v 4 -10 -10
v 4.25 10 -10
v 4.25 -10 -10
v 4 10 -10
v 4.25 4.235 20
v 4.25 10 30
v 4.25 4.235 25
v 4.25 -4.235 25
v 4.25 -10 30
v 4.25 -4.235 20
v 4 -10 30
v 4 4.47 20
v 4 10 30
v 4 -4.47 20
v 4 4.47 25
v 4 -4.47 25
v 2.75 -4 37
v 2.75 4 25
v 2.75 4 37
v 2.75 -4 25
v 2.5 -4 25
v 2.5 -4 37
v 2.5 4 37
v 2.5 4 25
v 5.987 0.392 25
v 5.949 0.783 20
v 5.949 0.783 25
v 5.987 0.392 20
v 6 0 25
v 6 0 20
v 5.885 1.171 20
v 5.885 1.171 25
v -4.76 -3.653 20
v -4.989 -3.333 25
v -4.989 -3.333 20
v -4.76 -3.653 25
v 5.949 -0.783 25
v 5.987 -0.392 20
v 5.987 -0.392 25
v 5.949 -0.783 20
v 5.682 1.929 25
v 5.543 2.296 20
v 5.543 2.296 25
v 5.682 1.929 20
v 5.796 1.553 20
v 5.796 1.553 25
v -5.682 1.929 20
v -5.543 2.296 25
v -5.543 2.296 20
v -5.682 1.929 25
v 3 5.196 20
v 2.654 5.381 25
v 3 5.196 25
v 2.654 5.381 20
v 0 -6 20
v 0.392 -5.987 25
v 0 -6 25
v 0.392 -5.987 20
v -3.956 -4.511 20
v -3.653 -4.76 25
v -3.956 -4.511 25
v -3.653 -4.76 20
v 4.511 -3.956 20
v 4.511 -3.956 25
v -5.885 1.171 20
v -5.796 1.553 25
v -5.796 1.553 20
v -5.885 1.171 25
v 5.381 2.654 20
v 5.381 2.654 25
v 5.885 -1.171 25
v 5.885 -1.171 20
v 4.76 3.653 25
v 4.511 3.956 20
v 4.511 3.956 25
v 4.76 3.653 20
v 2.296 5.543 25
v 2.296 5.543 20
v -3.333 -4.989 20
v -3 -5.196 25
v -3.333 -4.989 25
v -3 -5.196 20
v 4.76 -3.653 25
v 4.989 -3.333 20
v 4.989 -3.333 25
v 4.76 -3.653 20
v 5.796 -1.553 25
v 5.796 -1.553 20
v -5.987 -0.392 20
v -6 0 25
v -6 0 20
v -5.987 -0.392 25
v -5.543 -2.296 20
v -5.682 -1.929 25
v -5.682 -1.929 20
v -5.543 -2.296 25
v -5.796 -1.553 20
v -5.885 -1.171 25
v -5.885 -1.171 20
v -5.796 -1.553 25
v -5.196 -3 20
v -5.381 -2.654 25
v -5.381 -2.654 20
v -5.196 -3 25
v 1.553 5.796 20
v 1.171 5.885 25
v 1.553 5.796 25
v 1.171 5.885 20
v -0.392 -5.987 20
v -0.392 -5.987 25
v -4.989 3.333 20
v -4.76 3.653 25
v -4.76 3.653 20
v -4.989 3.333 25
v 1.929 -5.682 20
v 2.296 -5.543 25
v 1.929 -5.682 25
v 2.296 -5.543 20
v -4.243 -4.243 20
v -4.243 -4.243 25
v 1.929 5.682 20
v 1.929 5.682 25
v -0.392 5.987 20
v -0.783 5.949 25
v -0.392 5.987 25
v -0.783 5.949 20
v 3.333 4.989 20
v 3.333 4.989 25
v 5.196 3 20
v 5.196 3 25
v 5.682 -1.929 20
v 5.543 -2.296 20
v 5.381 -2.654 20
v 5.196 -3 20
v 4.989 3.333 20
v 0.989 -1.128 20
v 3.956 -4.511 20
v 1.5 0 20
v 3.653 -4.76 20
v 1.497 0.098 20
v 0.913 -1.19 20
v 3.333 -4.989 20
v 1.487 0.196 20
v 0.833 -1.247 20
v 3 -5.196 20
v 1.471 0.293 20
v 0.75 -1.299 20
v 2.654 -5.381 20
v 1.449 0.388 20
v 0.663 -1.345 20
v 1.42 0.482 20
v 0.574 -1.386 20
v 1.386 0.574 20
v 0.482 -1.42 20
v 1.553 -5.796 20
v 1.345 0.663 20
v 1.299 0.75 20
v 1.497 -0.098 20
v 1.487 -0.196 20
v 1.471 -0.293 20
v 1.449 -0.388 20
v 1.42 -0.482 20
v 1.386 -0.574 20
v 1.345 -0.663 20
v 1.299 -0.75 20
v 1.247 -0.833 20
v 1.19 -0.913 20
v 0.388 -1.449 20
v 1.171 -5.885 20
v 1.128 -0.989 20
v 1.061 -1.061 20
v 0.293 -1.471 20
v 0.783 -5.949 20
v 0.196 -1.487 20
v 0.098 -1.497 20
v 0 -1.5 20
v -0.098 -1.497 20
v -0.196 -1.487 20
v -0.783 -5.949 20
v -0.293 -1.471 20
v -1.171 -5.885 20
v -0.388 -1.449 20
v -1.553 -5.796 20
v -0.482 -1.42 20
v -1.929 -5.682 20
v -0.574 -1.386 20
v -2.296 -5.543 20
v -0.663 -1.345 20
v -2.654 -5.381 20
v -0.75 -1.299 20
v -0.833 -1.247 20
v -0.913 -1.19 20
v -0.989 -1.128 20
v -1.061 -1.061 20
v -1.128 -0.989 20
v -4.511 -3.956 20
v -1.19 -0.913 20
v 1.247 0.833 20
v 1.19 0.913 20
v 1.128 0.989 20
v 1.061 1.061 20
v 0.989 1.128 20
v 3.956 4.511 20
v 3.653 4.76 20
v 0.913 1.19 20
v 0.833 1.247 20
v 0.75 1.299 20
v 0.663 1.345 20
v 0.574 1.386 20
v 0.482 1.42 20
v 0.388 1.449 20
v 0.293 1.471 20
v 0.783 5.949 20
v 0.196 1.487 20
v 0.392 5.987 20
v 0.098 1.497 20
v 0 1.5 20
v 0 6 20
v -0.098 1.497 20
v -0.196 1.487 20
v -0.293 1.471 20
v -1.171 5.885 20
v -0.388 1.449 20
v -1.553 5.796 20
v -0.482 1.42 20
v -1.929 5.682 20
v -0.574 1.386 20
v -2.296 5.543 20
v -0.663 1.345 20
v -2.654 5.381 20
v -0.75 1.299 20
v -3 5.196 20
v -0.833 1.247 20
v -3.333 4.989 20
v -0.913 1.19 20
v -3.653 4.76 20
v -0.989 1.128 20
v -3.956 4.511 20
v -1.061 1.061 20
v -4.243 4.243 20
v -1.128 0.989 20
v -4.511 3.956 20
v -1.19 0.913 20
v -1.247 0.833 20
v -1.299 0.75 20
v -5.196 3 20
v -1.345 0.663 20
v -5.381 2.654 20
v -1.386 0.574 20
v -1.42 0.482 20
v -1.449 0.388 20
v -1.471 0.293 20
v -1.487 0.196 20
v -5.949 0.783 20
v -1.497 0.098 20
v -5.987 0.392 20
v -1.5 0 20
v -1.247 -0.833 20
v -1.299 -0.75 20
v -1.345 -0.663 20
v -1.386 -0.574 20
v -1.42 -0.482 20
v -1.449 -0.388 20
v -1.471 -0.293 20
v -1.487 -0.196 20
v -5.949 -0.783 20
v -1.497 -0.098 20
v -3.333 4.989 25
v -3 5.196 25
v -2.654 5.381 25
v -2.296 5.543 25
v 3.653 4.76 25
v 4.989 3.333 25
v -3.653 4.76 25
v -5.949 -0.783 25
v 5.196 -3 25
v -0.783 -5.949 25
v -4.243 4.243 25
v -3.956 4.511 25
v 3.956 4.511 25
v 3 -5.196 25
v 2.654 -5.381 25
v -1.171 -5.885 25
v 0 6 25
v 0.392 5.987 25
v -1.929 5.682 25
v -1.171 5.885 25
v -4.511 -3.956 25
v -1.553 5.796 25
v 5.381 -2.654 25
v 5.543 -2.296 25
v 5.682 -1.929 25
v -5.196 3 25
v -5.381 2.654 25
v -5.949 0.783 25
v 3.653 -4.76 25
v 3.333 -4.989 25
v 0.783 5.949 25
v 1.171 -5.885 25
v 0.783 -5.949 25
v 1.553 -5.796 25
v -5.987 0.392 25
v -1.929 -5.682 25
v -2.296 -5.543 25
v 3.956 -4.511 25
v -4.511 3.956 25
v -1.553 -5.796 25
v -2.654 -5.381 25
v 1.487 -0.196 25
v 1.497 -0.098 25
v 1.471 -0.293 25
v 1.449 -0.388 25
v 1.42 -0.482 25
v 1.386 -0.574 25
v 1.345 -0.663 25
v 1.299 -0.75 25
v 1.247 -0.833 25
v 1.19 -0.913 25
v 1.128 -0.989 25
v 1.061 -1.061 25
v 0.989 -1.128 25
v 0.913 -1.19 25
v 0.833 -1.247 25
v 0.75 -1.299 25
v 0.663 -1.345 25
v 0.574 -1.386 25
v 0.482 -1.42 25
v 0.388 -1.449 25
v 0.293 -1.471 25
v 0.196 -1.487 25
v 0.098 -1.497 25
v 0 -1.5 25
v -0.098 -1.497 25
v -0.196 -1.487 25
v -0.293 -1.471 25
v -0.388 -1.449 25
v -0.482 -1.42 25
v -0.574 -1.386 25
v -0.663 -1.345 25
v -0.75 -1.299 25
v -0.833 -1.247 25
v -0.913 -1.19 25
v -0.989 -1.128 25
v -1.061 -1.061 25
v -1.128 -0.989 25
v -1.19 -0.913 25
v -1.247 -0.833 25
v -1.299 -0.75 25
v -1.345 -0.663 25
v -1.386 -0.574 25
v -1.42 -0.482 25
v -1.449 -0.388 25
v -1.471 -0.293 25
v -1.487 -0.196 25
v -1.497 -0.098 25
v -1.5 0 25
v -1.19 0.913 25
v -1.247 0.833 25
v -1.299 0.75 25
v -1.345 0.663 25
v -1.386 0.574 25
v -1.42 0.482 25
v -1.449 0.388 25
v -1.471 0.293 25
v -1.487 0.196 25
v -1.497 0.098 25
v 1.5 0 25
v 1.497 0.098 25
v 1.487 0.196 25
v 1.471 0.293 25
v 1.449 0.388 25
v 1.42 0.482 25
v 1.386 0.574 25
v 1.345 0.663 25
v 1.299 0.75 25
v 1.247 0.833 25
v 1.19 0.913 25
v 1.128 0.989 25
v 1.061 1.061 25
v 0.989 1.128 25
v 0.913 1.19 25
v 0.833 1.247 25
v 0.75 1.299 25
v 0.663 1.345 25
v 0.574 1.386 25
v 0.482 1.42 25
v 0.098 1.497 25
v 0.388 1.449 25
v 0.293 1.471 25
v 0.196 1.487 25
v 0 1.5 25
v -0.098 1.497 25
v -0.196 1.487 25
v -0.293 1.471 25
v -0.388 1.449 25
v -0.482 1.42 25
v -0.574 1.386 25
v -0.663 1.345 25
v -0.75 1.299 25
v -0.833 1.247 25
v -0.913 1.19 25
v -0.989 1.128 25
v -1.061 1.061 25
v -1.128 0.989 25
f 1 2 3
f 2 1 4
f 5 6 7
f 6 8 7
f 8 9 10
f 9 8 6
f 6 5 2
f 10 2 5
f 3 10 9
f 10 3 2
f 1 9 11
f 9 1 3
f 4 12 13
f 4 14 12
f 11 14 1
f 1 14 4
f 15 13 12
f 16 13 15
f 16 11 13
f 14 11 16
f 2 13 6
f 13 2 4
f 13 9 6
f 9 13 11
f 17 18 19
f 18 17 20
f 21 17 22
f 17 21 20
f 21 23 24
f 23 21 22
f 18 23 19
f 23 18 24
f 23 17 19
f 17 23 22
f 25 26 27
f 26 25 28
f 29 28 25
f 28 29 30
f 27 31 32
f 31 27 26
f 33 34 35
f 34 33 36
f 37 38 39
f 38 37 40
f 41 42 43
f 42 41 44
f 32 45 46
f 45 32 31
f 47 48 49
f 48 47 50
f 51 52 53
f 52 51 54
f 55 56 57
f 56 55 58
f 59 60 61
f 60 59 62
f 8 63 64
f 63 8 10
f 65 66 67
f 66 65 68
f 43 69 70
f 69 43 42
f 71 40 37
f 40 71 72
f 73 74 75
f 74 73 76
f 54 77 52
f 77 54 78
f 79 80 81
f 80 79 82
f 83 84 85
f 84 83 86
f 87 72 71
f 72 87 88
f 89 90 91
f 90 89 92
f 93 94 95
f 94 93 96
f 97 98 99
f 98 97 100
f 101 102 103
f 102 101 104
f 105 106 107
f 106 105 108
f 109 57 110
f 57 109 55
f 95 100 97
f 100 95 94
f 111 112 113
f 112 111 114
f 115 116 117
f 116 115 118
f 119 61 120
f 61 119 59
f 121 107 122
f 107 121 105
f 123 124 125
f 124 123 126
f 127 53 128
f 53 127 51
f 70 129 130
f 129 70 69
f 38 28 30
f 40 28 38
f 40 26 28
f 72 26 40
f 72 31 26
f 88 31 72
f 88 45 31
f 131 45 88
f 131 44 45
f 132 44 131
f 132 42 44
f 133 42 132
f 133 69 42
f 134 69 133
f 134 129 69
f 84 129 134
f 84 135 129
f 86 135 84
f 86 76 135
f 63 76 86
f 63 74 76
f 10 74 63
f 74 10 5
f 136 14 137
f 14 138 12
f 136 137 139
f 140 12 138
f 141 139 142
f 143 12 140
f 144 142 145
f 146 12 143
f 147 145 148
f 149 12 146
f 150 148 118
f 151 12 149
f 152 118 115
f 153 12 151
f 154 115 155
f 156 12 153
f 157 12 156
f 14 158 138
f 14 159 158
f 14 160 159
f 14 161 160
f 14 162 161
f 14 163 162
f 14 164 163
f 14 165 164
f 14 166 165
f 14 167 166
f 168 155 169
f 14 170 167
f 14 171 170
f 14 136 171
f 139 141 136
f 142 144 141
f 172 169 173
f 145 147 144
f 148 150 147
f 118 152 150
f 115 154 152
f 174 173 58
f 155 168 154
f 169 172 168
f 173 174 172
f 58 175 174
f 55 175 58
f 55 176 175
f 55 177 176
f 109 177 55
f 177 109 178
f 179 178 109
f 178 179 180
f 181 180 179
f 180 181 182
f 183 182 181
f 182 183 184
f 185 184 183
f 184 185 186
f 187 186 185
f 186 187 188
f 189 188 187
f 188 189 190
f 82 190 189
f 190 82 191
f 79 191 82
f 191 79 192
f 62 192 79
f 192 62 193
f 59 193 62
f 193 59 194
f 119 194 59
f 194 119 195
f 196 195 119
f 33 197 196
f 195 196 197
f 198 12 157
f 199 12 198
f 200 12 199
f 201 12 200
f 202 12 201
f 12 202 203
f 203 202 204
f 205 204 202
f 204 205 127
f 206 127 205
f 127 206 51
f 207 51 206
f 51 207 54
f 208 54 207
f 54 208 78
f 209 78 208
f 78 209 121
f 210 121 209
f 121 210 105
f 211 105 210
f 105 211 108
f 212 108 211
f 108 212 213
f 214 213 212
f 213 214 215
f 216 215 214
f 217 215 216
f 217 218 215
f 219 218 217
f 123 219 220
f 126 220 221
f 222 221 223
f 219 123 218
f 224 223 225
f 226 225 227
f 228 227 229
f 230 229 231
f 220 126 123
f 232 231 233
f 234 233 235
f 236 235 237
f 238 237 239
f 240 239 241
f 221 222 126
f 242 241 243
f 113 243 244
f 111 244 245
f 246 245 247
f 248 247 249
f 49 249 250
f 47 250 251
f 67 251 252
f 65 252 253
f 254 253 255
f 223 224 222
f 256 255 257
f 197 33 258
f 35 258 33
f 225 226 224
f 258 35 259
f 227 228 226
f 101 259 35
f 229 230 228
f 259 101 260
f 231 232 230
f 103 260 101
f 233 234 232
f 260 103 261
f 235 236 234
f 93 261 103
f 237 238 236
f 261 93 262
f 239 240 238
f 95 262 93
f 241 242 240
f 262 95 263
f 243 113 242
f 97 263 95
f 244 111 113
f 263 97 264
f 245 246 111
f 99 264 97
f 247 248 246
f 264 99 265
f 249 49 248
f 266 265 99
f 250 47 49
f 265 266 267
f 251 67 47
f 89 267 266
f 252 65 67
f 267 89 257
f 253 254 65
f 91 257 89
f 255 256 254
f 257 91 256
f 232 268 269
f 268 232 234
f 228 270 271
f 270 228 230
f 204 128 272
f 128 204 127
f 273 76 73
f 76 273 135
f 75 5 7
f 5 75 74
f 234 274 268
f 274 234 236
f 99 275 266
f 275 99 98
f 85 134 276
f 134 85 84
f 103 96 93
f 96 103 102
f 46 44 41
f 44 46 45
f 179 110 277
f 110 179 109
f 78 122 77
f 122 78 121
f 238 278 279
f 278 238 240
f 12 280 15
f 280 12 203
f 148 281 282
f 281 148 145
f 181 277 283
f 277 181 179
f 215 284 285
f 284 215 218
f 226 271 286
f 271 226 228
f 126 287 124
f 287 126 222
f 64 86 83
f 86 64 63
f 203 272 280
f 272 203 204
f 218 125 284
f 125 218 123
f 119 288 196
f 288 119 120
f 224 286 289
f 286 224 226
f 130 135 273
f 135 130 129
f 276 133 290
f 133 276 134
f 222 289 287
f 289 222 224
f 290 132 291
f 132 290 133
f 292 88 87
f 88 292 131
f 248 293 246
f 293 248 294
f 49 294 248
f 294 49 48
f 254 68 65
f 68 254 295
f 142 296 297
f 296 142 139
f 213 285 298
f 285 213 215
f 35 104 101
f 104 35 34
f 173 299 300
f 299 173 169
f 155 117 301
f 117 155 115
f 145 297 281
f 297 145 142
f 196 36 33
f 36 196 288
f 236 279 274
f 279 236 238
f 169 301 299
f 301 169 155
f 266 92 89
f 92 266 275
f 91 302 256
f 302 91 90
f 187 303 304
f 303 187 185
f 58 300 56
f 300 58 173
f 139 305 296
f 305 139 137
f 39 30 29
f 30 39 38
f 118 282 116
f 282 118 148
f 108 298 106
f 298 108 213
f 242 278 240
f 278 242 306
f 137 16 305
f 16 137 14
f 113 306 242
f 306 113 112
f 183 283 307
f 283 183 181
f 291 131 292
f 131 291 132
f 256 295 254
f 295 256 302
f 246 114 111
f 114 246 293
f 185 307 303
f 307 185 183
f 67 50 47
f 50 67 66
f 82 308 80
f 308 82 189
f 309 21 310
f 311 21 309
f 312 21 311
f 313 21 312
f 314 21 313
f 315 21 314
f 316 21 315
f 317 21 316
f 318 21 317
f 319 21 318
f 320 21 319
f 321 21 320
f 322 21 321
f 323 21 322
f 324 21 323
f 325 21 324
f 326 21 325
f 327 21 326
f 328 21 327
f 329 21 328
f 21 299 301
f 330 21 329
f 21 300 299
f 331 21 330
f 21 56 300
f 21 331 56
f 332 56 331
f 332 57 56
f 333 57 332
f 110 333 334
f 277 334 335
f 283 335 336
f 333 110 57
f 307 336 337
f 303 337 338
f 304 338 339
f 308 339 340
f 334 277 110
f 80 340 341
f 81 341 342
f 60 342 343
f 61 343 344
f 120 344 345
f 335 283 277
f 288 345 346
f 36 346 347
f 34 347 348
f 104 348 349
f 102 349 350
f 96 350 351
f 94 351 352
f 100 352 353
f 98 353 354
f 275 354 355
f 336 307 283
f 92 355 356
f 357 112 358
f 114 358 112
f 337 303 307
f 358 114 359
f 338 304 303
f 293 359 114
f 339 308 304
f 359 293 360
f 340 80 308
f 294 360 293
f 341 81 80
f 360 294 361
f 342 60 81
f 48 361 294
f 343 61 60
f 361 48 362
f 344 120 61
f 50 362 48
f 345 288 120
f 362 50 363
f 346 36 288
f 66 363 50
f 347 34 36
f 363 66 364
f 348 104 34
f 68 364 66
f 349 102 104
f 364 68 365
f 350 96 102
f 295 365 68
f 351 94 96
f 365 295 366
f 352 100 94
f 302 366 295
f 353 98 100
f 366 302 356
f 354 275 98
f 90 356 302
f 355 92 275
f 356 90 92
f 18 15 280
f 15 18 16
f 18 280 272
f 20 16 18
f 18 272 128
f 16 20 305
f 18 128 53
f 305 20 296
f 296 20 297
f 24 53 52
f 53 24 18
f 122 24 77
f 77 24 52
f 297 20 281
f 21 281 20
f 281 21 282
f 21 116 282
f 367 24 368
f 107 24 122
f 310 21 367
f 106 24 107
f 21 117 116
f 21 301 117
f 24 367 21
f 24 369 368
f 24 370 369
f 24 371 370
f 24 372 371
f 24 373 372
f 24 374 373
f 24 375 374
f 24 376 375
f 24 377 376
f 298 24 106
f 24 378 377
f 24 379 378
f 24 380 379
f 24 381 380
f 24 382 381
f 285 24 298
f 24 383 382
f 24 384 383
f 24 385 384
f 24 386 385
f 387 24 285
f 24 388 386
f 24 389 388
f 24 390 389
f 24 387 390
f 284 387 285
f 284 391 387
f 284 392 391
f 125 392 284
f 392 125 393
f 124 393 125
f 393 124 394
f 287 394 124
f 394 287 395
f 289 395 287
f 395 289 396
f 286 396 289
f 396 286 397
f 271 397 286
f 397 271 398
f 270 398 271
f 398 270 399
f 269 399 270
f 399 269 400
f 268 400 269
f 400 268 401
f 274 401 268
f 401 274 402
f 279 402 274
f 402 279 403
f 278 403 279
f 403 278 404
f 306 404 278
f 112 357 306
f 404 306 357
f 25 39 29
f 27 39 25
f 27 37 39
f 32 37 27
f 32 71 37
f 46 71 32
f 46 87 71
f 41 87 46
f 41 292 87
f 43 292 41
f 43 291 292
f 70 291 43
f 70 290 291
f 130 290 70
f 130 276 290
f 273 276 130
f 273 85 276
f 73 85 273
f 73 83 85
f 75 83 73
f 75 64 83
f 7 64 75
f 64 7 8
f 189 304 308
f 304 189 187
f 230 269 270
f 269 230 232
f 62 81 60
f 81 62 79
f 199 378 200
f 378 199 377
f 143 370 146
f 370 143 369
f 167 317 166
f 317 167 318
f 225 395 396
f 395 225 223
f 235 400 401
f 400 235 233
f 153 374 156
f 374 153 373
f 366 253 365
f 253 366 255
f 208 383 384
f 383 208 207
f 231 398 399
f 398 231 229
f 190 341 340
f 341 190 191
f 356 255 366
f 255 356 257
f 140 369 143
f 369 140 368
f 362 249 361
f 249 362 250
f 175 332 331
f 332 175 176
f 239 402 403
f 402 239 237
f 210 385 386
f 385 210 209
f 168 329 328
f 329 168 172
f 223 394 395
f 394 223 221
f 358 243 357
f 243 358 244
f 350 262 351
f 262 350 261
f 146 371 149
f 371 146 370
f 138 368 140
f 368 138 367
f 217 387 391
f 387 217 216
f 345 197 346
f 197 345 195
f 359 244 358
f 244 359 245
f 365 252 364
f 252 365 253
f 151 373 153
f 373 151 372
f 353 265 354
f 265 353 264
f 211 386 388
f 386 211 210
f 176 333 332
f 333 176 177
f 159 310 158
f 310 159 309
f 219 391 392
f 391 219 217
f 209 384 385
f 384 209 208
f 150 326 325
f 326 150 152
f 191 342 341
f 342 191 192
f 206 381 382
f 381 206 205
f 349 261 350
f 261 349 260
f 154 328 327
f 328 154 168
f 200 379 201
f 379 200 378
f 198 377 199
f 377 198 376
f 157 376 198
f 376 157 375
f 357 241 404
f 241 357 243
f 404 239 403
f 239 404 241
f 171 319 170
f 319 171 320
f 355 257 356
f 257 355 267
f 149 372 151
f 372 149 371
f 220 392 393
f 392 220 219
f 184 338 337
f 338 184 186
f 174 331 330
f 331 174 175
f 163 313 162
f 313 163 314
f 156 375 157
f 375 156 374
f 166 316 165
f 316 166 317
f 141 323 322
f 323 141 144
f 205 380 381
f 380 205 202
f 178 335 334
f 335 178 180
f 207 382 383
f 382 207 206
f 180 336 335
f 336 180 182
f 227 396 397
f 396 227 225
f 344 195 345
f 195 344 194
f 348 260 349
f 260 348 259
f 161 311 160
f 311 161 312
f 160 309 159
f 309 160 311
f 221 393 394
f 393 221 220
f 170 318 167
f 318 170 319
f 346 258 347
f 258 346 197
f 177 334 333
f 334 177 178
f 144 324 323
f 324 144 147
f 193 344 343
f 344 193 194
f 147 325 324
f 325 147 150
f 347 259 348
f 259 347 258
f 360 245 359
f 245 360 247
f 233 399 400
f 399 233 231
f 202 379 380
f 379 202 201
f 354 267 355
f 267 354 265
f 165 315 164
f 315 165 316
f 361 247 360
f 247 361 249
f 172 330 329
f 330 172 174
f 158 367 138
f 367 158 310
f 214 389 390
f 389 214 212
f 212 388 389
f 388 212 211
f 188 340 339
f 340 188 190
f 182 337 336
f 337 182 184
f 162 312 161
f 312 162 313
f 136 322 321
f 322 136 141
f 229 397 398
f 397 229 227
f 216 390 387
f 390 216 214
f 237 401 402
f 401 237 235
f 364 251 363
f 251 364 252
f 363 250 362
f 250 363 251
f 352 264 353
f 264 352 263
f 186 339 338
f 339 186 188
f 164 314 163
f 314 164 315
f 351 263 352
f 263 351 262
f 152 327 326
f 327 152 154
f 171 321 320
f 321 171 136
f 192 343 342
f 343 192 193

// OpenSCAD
// Hose-barb reducer: 8 mm ID -> 5 mm ID
// Print orientation: standing upright along +Z

// ---- Parameters ----
eps      = 0.5;   // overcut for clean differences
$fn      = 96;    // smoothness of curved surfaces

tube_d1  = 8;     // inner diameter of large tubing
tube_d2  = 5;     // inner diameter of small tubing
bore     = 3;     // through-bore diameter

base_h   = 20;    // height of first barb section
collar_d = 12;    // diameter of joining collar
collar_h = 5;     // height of collar

top_h    = 8;     // height of second barb section
total_l  = base_h + collar_h + top_h;  // 41 mm overall length

// ---- Derived ----
wd1 = tube_d1 + 0.5;   // outer diameter of first barbs (grows to 9.5)
wd2 = tube_d2 + 0.5;   // outer diameter of top barbs (shrinks from 6.5)

// ---- Model ----
difference() {
    union() {
        // Sawtooth barbs for 8 mm tubing (z = 0 .. 20)
        for (s = [-1, 1])
            translate([0, 0, s * base_h / 2])
                linear_extrude(height = base_h)
                    polygon([
                        [wd1 / 2, base_h / 2],
                        [wd1 / 2, -base_h / 2],
                        [(wd1 - 0.5) / 2, -base_h / 2],
                        [(wd1 - 0.5) / 2, base_h / 2]
                    ]);

        // Cylindrical collar (z = 20 .. 25)
        translate([0, 0, base_h])
            cylinder(d = collar_d, h = collar_h);

        // Sawtooth barbs for 5 mm tubing (z = 25 .. 41)
        for (s = [-1, 1])
            translate([0, 0, base_h + collar_h + s * top_h / 2])
                linear_extrude(height = top_h)
                    polygon([
                        [wd2 / 2, -top_h / 2],
                        [(wd2 - 0.5) / 2, -top_h / 2],
                        [(wd2 - 0.5) / 2, top_h / 2],
                        [wd2 / 2, top_h / 2]
                    ]);
    }

    // Full-length bore through the part
    translate([0, 0, -eps])
        cylinder(d = bore, h = total_l + 2 * eps);
}
